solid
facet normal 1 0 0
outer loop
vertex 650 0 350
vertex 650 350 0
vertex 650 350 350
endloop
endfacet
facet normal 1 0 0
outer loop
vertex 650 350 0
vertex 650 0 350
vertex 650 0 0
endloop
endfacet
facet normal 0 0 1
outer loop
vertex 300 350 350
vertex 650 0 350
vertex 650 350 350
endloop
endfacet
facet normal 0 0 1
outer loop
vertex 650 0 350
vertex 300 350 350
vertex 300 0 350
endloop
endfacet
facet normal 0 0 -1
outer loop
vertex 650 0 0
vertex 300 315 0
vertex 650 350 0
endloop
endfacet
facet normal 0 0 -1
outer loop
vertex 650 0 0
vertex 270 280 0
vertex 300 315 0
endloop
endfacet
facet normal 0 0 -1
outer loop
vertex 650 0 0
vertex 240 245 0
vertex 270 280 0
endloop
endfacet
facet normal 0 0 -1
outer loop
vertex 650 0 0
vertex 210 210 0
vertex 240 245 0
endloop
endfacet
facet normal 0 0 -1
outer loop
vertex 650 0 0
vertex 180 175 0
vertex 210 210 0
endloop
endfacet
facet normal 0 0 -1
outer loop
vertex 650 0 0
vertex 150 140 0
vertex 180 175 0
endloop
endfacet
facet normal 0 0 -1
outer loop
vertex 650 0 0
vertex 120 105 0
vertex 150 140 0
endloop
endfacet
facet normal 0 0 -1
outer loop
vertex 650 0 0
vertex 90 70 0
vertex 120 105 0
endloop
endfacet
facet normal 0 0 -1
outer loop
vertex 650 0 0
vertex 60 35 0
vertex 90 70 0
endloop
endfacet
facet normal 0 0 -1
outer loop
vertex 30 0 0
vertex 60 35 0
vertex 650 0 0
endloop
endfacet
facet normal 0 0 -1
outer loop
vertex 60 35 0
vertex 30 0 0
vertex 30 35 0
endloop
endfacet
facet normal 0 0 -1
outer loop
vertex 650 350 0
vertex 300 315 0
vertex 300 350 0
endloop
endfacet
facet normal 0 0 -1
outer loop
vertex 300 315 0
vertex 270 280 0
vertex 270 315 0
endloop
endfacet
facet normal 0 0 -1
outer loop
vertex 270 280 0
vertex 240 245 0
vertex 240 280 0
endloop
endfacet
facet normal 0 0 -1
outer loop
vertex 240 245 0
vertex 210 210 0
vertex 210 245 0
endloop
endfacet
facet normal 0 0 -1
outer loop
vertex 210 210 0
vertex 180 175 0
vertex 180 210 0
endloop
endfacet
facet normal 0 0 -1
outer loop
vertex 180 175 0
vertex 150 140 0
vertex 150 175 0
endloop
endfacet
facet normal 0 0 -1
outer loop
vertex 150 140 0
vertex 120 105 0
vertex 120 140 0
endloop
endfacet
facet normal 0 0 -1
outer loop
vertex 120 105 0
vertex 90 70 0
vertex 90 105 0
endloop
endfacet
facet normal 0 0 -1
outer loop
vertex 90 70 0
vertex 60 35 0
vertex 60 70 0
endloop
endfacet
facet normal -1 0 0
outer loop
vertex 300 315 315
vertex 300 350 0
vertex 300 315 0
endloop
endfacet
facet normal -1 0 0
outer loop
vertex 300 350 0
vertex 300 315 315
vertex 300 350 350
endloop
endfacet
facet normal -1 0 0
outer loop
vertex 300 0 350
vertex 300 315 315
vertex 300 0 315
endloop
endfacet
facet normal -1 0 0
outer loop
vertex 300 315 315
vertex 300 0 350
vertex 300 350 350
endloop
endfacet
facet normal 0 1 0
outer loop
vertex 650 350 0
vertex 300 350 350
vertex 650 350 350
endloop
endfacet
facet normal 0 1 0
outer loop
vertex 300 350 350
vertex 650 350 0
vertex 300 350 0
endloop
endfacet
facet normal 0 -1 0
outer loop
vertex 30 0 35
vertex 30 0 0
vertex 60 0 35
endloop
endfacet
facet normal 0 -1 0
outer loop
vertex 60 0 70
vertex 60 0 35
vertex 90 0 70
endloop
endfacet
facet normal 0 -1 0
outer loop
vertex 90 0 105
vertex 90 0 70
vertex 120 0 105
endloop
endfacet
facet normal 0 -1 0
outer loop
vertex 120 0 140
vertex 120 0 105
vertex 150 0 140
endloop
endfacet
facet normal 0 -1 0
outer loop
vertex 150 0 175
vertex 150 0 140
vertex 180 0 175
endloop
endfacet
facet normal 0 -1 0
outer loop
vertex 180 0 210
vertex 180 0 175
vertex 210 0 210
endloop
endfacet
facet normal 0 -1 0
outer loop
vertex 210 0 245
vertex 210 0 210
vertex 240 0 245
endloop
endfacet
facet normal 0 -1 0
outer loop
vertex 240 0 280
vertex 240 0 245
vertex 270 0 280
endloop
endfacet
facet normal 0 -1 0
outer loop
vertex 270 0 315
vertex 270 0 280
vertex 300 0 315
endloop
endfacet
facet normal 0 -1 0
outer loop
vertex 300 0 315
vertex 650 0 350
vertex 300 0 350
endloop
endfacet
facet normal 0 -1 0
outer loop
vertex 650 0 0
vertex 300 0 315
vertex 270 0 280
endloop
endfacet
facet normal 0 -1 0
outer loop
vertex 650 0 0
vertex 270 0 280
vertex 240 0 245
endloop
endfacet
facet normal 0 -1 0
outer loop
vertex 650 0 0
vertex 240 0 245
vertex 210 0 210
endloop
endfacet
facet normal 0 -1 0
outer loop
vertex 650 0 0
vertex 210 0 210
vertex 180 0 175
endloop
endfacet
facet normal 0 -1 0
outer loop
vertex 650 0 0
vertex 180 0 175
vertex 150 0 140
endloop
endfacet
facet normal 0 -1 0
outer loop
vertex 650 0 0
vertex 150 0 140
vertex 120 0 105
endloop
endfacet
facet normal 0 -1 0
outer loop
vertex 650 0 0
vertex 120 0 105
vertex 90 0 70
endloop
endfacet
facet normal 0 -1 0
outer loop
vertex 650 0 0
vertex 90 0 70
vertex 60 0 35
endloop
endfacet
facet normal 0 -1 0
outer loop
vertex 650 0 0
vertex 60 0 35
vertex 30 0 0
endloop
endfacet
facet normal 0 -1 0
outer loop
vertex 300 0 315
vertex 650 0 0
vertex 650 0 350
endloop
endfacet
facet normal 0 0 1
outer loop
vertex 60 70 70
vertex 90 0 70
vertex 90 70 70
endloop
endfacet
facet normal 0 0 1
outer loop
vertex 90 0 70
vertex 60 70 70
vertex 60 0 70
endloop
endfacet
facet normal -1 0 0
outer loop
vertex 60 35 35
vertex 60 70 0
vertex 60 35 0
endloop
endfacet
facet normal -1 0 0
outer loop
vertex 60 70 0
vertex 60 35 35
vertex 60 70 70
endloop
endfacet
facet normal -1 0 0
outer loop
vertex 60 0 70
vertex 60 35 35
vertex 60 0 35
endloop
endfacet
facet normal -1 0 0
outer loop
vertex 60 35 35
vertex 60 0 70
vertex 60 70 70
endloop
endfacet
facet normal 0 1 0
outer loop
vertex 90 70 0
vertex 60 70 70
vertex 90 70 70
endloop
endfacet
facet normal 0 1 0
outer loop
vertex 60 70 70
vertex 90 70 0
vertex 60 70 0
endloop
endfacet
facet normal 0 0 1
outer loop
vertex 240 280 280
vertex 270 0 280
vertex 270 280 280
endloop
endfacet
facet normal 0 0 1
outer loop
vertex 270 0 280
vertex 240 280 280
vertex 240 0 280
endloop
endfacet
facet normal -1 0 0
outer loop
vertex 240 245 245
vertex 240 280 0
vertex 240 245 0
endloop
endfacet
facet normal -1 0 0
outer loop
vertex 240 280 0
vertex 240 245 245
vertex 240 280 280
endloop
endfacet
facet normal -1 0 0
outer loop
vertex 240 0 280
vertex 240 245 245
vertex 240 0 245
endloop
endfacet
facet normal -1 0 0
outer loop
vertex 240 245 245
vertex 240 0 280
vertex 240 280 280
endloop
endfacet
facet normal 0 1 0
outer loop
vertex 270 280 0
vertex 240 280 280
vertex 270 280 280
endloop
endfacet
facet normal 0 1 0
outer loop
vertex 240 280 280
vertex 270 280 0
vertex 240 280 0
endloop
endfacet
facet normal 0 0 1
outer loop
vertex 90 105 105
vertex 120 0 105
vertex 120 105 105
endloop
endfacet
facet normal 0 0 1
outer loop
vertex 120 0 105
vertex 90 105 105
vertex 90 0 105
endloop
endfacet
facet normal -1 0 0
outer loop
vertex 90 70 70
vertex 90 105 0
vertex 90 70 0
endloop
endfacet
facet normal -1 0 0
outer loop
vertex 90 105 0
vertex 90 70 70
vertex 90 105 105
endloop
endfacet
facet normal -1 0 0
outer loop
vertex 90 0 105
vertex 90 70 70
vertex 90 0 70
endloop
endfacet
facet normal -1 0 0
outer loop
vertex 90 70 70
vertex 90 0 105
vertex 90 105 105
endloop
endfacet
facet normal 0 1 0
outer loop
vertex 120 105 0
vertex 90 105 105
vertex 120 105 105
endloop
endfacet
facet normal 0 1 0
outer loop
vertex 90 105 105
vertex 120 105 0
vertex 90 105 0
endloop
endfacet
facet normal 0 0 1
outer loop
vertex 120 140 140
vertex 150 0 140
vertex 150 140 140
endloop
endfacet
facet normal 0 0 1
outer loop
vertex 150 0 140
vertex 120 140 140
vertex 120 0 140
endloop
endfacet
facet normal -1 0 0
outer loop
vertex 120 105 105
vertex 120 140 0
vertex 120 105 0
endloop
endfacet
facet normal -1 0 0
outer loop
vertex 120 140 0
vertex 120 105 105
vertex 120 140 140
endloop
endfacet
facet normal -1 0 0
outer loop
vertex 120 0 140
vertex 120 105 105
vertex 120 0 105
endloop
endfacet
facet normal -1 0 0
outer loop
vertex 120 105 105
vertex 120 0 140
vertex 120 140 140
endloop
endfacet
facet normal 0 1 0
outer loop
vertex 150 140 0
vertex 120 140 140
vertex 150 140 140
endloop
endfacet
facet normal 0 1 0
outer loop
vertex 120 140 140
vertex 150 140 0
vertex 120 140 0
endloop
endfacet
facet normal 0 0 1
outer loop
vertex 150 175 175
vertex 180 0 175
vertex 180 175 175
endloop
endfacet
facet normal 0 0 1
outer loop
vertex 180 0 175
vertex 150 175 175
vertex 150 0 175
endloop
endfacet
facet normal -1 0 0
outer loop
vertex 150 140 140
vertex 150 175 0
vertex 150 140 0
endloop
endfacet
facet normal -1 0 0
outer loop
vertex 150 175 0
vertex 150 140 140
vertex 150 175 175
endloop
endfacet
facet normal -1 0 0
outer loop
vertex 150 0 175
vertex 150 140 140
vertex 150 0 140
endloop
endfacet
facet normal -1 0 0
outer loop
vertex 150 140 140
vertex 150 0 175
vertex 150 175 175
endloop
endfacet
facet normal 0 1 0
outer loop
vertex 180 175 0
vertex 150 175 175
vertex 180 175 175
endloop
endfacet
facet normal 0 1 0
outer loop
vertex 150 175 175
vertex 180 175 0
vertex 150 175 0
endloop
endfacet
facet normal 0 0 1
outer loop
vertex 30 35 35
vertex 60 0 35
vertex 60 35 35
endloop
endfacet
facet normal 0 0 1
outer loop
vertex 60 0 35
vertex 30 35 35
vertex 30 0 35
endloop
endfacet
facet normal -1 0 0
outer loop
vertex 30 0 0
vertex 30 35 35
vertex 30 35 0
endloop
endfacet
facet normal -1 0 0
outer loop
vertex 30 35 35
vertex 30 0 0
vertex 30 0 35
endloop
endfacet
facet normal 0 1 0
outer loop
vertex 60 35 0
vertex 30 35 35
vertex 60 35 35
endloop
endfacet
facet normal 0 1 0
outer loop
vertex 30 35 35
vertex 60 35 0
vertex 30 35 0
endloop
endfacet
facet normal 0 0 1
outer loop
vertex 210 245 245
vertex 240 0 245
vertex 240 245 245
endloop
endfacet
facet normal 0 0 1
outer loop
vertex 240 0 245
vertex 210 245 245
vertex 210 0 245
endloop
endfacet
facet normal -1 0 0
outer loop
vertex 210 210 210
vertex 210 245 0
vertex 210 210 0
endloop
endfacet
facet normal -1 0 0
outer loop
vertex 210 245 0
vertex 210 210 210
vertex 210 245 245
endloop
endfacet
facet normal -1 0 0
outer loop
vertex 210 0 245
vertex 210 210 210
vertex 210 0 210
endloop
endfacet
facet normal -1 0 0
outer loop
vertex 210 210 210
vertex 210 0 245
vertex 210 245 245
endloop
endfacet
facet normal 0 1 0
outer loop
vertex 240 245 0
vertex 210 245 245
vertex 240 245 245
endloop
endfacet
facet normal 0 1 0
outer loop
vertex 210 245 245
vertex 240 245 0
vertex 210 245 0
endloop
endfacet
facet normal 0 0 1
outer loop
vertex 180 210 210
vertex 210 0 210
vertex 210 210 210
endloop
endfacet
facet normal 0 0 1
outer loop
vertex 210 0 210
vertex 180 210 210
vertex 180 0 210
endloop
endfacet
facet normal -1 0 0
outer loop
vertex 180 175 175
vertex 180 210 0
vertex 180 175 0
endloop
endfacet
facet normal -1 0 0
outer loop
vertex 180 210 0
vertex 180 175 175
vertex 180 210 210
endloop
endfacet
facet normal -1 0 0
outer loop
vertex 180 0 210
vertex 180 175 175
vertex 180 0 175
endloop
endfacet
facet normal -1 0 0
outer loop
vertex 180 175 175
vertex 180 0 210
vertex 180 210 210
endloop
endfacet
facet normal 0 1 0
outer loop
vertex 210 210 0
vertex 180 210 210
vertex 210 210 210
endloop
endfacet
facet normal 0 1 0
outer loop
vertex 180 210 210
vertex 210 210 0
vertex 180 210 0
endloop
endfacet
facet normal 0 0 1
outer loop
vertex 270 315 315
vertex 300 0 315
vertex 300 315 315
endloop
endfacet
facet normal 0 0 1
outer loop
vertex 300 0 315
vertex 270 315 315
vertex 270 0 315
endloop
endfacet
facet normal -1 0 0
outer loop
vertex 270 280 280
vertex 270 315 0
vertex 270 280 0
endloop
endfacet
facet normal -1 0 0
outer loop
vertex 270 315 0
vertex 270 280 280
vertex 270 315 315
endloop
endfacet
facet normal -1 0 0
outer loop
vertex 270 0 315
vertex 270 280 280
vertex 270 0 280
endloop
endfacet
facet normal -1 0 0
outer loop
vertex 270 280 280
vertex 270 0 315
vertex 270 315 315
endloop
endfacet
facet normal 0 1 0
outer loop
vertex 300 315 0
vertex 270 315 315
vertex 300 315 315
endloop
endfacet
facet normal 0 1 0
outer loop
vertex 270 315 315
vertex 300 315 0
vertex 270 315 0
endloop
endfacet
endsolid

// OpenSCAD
union() { 
    translate([300, 0, 0]) { 
        cube([350, 350, 350]);
    }
    translate([60, 0, 0]) { 
        cube([70, 70, 70]);
    }
    translate([240, 0, 0]) { 
        cube([280, 280, 280]);
    }
    translate([90, 0, 0]) { 
        cube([105, 105, 105]);
    }
    translate([120, 0, 0]) { 
        cube([140, 140, 140]);
    }
    translate([150, 0, 0]) { 
        cube([175, 175, 175]);
    }
    translate([30, 0, 0]) { 
        cube([35, 35, 35]);
    }
    translate([210, 0, 0]) { 
        cube([245, 245, 245]);
    }
    translate([180, 0, 0]) { 
        cube([210, 210, 210]);
    }
    translate([270, 0, 0]) { 
        cube([315, 315, 315]);
    }
}
